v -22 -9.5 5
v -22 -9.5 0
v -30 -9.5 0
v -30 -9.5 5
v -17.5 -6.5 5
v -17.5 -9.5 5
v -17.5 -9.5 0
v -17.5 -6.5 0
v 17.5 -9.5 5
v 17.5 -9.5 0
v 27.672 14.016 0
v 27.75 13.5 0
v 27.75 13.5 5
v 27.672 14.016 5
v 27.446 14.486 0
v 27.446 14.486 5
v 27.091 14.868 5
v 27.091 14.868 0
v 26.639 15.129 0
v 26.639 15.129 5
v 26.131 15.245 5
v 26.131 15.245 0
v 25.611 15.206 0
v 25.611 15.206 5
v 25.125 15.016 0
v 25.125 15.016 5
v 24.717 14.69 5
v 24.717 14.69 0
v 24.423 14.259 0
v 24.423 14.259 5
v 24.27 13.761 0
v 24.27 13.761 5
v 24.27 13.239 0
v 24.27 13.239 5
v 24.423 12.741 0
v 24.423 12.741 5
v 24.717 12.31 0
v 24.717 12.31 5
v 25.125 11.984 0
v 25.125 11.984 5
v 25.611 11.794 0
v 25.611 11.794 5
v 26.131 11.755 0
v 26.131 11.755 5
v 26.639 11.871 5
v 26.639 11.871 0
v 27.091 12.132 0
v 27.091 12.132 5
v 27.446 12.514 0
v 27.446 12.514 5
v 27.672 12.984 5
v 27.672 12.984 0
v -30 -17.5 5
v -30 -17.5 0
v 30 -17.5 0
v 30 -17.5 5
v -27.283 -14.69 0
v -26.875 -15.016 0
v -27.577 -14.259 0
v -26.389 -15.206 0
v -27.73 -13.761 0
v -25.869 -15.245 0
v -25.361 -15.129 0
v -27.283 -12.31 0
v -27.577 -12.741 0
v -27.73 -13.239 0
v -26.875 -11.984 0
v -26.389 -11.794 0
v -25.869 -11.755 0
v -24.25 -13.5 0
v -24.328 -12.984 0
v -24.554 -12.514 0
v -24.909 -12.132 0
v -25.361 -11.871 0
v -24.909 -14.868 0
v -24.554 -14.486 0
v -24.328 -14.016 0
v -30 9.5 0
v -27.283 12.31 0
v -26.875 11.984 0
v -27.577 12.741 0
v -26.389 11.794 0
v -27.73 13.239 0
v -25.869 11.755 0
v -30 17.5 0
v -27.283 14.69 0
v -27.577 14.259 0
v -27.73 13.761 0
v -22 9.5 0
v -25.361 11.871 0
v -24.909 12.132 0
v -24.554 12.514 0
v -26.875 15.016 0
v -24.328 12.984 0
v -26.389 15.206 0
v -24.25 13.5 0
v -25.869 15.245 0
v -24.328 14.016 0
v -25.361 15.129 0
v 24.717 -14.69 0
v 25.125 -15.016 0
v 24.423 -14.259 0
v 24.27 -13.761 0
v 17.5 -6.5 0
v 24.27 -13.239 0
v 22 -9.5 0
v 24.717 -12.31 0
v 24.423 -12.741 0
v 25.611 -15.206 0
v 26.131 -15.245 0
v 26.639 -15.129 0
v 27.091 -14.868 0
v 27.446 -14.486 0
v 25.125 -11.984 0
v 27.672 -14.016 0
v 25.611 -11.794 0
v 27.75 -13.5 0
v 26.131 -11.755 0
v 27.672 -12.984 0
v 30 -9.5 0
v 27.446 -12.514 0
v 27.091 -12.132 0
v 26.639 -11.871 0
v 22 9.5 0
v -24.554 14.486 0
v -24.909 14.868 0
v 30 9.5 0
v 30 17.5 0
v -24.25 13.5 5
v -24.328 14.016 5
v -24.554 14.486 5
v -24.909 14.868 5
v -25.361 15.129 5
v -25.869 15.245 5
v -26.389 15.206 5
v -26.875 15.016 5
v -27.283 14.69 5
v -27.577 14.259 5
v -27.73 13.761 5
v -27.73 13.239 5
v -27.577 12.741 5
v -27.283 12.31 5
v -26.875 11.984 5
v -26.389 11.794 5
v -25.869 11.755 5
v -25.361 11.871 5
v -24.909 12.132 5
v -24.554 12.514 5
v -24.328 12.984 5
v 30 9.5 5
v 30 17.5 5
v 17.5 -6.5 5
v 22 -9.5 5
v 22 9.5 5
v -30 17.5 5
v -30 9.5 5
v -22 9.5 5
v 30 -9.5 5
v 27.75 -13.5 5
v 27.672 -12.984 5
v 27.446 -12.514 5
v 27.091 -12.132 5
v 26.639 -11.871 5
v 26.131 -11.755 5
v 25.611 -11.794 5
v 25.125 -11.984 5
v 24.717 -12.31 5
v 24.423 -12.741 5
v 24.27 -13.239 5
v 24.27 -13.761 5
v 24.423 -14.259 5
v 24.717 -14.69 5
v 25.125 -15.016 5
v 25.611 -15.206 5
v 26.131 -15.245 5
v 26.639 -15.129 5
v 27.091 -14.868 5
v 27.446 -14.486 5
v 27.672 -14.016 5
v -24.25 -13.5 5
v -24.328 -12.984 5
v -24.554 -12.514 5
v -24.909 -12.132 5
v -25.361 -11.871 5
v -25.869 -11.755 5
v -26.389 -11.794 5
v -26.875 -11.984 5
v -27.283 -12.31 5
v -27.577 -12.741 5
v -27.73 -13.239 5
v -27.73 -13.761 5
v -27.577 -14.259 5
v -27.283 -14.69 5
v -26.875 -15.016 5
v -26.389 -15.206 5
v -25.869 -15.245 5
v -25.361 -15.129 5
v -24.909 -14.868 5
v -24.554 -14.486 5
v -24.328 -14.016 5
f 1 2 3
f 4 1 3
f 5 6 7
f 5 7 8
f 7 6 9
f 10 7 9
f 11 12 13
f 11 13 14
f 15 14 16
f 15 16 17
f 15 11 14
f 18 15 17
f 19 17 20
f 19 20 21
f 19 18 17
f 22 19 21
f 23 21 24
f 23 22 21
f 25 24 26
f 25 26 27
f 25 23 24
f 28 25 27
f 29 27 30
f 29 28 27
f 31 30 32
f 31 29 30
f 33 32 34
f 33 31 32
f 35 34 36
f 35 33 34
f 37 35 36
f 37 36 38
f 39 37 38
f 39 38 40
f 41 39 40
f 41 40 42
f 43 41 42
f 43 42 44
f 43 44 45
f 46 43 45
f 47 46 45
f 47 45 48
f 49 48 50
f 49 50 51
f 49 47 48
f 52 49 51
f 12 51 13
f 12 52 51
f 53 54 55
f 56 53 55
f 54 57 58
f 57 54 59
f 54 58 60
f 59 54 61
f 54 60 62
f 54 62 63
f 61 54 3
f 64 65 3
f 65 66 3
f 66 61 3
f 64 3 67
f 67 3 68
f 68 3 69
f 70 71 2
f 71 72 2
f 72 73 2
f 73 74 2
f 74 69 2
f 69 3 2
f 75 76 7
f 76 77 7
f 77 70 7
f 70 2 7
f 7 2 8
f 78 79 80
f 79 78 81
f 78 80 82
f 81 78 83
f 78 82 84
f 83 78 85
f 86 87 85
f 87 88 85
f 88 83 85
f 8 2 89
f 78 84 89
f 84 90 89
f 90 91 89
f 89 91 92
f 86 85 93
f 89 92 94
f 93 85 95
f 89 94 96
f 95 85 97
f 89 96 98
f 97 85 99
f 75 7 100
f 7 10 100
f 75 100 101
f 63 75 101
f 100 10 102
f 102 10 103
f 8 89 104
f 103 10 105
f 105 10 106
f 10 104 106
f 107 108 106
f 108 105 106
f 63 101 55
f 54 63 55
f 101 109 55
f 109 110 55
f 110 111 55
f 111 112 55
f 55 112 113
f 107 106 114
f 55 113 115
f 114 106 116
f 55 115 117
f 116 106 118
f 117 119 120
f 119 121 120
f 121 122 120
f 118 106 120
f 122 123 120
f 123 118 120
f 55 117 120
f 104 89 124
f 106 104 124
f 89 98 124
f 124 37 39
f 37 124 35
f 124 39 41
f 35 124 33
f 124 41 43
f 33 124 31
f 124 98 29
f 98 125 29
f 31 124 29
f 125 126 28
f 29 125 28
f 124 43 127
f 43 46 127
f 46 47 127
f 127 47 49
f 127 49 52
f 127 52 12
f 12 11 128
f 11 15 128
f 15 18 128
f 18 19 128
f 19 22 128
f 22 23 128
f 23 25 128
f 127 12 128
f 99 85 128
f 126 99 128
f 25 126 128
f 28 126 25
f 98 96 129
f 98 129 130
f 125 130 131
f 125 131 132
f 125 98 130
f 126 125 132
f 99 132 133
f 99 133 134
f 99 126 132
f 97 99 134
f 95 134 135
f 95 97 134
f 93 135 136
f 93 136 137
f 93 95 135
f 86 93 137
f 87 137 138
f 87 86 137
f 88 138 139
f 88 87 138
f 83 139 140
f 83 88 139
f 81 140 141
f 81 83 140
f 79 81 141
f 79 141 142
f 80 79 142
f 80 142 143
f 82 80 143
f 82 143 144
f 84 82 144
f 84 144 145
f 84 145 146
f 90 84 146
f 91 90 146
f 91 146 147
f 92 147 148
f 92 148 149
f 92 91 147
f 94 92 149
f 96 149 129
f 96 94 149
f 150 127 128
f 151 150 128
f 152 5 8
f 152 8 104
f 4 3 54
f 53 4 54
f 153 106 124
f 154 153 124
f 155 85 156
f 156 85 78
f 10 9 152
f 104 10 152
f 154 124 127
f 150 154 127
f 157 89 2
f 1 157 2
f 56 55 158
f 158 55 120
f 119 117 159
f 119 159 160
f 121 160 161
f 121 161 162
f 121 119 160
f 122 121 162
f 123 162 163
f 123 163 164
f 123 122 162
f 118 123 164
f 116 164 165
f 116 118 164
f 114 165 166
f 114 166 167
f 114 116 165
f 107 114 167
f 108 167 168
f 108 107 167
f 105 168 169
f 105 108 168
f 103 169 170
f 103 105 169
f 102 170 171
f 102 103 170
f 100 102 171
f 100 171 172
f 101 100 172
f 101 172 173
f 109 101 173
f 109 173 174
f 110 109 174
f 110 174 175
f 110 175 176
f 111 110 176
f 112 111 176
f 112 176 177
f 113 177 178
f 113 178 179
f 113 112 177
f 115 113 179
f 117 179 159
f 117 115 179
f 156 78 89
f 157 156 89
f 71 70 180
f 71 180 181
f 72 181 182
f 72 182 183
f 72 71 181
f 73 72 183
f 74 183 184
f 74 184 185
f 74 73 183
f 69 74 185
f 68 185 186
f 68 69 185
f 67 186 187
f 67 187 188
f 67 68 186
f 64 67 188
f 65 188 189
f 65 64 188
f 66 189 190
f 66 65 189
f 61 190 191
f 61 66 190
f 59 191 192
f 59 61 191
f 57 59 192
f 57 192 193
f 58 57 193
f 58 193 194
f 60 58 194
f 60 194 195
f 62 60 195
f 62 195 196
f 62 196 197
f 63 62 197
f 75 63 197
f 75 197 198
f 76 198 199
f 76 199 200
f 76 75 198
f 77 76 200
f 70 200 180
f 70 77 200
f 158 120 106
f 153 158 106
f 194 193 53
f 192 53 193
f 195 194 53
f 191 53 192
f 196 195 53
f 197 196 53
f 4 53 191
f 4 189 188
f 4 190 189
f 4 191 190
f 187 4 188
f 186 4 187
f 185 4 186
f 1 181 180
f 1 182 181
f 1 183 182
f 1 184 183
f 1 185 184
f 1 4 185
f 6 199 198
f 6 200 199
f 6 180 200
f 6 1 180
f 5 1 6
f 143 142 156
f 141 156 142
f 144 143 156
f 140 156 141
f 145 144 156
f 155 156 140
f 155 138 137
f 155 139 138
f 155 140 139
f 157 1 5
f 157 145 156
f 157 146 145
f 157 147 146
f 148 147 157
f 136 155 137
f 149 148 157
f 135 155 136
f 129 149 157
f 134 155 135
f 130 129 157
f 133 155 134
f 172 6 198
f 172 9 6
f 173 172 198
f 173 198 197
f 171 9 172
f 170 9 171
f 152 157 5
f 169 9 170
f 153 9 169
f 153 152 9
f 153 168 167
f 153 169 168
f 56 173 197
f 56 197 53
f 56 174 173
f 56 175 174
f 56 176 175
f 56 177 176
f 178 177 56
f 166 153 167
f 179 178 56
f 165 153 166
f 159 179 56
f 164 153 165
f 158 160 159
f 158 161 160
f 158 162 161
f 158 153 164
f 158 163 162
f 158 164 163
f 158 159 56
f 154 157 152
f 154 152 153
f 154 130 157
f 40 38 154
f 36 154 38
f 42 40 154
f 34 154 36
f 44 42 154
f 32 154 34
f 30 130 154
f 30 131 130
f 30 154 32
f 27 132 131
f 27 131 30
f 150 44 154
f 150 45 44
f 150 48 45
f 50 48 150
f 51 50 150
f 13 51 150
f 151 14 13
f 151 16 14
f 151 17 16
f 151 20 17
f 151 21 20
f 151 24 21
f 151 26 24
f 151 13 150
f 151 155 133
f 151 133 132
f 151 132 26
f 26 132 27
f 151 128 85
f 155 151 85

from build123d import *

# Parameters (mm, degrees)
SKETCH_1_R          = 1.75
EXTRUDE_1_DEPTH     = 5
CUT_EXTRUDE_1_REACH = 7
SKETCH_2_W          = 35
SKETCH_2_H          = 3


with BuildPart() as part:
    # 草圖1 → 填料-伸長1 (new body)
    with BuildSketch(Plane.XY):
        Polygon((-30, 17.5), (-30, 9.5), (-22, 9.5), (-22, -9.5), (-30, -9.5), (-30, -17.5), (30, -17.5), (30, -9.5), (22, -9.5), (22, 9.5), (30, 9.5), (30, 17.5), align=None)
        with Locations((-26, 13.5)):
            Circle(SKETCH_1_R, mode=Mode.SUBTRACT)
        with Locations((26, 13.5)):
            Circle(SKETCH_1_R, mode=Mode.SUBTRACT)
        with Locations((-26, -13.5)):
            Circle(SKETCH_1_R, mode=Mode.SUBTRACT)
        with Locations((26, -13.5)):
            Circle(SKETCH_1_R, mode=Mode.SUBTRACT)
    extrude(amount=EXTRUDE_1_DEPTH)

    # 草圖2 → 除料-伸長1 (cut, up to next)
    with BuildSketch(Plane.XY.offset(5), mode=Mode.PRIVATE) as cut_extrude_1_sk1:
        with Locations((0, -8)):
            Rectangle(SKETCH_2_W, SKETCH_2_H)
    cut_extrude_1_tool1 = extrude(cut_extrude_1_sk1.sketch, amount=-CUT_EXTRUDE_1_REACH, mode=Mode.PRIVATE) & part.part
    add(cut_extrude_1_tool1.solids().sort_by_distance((0, -8, 5))[0], mode=Mode.SUBTRACT)


solid = part.part
